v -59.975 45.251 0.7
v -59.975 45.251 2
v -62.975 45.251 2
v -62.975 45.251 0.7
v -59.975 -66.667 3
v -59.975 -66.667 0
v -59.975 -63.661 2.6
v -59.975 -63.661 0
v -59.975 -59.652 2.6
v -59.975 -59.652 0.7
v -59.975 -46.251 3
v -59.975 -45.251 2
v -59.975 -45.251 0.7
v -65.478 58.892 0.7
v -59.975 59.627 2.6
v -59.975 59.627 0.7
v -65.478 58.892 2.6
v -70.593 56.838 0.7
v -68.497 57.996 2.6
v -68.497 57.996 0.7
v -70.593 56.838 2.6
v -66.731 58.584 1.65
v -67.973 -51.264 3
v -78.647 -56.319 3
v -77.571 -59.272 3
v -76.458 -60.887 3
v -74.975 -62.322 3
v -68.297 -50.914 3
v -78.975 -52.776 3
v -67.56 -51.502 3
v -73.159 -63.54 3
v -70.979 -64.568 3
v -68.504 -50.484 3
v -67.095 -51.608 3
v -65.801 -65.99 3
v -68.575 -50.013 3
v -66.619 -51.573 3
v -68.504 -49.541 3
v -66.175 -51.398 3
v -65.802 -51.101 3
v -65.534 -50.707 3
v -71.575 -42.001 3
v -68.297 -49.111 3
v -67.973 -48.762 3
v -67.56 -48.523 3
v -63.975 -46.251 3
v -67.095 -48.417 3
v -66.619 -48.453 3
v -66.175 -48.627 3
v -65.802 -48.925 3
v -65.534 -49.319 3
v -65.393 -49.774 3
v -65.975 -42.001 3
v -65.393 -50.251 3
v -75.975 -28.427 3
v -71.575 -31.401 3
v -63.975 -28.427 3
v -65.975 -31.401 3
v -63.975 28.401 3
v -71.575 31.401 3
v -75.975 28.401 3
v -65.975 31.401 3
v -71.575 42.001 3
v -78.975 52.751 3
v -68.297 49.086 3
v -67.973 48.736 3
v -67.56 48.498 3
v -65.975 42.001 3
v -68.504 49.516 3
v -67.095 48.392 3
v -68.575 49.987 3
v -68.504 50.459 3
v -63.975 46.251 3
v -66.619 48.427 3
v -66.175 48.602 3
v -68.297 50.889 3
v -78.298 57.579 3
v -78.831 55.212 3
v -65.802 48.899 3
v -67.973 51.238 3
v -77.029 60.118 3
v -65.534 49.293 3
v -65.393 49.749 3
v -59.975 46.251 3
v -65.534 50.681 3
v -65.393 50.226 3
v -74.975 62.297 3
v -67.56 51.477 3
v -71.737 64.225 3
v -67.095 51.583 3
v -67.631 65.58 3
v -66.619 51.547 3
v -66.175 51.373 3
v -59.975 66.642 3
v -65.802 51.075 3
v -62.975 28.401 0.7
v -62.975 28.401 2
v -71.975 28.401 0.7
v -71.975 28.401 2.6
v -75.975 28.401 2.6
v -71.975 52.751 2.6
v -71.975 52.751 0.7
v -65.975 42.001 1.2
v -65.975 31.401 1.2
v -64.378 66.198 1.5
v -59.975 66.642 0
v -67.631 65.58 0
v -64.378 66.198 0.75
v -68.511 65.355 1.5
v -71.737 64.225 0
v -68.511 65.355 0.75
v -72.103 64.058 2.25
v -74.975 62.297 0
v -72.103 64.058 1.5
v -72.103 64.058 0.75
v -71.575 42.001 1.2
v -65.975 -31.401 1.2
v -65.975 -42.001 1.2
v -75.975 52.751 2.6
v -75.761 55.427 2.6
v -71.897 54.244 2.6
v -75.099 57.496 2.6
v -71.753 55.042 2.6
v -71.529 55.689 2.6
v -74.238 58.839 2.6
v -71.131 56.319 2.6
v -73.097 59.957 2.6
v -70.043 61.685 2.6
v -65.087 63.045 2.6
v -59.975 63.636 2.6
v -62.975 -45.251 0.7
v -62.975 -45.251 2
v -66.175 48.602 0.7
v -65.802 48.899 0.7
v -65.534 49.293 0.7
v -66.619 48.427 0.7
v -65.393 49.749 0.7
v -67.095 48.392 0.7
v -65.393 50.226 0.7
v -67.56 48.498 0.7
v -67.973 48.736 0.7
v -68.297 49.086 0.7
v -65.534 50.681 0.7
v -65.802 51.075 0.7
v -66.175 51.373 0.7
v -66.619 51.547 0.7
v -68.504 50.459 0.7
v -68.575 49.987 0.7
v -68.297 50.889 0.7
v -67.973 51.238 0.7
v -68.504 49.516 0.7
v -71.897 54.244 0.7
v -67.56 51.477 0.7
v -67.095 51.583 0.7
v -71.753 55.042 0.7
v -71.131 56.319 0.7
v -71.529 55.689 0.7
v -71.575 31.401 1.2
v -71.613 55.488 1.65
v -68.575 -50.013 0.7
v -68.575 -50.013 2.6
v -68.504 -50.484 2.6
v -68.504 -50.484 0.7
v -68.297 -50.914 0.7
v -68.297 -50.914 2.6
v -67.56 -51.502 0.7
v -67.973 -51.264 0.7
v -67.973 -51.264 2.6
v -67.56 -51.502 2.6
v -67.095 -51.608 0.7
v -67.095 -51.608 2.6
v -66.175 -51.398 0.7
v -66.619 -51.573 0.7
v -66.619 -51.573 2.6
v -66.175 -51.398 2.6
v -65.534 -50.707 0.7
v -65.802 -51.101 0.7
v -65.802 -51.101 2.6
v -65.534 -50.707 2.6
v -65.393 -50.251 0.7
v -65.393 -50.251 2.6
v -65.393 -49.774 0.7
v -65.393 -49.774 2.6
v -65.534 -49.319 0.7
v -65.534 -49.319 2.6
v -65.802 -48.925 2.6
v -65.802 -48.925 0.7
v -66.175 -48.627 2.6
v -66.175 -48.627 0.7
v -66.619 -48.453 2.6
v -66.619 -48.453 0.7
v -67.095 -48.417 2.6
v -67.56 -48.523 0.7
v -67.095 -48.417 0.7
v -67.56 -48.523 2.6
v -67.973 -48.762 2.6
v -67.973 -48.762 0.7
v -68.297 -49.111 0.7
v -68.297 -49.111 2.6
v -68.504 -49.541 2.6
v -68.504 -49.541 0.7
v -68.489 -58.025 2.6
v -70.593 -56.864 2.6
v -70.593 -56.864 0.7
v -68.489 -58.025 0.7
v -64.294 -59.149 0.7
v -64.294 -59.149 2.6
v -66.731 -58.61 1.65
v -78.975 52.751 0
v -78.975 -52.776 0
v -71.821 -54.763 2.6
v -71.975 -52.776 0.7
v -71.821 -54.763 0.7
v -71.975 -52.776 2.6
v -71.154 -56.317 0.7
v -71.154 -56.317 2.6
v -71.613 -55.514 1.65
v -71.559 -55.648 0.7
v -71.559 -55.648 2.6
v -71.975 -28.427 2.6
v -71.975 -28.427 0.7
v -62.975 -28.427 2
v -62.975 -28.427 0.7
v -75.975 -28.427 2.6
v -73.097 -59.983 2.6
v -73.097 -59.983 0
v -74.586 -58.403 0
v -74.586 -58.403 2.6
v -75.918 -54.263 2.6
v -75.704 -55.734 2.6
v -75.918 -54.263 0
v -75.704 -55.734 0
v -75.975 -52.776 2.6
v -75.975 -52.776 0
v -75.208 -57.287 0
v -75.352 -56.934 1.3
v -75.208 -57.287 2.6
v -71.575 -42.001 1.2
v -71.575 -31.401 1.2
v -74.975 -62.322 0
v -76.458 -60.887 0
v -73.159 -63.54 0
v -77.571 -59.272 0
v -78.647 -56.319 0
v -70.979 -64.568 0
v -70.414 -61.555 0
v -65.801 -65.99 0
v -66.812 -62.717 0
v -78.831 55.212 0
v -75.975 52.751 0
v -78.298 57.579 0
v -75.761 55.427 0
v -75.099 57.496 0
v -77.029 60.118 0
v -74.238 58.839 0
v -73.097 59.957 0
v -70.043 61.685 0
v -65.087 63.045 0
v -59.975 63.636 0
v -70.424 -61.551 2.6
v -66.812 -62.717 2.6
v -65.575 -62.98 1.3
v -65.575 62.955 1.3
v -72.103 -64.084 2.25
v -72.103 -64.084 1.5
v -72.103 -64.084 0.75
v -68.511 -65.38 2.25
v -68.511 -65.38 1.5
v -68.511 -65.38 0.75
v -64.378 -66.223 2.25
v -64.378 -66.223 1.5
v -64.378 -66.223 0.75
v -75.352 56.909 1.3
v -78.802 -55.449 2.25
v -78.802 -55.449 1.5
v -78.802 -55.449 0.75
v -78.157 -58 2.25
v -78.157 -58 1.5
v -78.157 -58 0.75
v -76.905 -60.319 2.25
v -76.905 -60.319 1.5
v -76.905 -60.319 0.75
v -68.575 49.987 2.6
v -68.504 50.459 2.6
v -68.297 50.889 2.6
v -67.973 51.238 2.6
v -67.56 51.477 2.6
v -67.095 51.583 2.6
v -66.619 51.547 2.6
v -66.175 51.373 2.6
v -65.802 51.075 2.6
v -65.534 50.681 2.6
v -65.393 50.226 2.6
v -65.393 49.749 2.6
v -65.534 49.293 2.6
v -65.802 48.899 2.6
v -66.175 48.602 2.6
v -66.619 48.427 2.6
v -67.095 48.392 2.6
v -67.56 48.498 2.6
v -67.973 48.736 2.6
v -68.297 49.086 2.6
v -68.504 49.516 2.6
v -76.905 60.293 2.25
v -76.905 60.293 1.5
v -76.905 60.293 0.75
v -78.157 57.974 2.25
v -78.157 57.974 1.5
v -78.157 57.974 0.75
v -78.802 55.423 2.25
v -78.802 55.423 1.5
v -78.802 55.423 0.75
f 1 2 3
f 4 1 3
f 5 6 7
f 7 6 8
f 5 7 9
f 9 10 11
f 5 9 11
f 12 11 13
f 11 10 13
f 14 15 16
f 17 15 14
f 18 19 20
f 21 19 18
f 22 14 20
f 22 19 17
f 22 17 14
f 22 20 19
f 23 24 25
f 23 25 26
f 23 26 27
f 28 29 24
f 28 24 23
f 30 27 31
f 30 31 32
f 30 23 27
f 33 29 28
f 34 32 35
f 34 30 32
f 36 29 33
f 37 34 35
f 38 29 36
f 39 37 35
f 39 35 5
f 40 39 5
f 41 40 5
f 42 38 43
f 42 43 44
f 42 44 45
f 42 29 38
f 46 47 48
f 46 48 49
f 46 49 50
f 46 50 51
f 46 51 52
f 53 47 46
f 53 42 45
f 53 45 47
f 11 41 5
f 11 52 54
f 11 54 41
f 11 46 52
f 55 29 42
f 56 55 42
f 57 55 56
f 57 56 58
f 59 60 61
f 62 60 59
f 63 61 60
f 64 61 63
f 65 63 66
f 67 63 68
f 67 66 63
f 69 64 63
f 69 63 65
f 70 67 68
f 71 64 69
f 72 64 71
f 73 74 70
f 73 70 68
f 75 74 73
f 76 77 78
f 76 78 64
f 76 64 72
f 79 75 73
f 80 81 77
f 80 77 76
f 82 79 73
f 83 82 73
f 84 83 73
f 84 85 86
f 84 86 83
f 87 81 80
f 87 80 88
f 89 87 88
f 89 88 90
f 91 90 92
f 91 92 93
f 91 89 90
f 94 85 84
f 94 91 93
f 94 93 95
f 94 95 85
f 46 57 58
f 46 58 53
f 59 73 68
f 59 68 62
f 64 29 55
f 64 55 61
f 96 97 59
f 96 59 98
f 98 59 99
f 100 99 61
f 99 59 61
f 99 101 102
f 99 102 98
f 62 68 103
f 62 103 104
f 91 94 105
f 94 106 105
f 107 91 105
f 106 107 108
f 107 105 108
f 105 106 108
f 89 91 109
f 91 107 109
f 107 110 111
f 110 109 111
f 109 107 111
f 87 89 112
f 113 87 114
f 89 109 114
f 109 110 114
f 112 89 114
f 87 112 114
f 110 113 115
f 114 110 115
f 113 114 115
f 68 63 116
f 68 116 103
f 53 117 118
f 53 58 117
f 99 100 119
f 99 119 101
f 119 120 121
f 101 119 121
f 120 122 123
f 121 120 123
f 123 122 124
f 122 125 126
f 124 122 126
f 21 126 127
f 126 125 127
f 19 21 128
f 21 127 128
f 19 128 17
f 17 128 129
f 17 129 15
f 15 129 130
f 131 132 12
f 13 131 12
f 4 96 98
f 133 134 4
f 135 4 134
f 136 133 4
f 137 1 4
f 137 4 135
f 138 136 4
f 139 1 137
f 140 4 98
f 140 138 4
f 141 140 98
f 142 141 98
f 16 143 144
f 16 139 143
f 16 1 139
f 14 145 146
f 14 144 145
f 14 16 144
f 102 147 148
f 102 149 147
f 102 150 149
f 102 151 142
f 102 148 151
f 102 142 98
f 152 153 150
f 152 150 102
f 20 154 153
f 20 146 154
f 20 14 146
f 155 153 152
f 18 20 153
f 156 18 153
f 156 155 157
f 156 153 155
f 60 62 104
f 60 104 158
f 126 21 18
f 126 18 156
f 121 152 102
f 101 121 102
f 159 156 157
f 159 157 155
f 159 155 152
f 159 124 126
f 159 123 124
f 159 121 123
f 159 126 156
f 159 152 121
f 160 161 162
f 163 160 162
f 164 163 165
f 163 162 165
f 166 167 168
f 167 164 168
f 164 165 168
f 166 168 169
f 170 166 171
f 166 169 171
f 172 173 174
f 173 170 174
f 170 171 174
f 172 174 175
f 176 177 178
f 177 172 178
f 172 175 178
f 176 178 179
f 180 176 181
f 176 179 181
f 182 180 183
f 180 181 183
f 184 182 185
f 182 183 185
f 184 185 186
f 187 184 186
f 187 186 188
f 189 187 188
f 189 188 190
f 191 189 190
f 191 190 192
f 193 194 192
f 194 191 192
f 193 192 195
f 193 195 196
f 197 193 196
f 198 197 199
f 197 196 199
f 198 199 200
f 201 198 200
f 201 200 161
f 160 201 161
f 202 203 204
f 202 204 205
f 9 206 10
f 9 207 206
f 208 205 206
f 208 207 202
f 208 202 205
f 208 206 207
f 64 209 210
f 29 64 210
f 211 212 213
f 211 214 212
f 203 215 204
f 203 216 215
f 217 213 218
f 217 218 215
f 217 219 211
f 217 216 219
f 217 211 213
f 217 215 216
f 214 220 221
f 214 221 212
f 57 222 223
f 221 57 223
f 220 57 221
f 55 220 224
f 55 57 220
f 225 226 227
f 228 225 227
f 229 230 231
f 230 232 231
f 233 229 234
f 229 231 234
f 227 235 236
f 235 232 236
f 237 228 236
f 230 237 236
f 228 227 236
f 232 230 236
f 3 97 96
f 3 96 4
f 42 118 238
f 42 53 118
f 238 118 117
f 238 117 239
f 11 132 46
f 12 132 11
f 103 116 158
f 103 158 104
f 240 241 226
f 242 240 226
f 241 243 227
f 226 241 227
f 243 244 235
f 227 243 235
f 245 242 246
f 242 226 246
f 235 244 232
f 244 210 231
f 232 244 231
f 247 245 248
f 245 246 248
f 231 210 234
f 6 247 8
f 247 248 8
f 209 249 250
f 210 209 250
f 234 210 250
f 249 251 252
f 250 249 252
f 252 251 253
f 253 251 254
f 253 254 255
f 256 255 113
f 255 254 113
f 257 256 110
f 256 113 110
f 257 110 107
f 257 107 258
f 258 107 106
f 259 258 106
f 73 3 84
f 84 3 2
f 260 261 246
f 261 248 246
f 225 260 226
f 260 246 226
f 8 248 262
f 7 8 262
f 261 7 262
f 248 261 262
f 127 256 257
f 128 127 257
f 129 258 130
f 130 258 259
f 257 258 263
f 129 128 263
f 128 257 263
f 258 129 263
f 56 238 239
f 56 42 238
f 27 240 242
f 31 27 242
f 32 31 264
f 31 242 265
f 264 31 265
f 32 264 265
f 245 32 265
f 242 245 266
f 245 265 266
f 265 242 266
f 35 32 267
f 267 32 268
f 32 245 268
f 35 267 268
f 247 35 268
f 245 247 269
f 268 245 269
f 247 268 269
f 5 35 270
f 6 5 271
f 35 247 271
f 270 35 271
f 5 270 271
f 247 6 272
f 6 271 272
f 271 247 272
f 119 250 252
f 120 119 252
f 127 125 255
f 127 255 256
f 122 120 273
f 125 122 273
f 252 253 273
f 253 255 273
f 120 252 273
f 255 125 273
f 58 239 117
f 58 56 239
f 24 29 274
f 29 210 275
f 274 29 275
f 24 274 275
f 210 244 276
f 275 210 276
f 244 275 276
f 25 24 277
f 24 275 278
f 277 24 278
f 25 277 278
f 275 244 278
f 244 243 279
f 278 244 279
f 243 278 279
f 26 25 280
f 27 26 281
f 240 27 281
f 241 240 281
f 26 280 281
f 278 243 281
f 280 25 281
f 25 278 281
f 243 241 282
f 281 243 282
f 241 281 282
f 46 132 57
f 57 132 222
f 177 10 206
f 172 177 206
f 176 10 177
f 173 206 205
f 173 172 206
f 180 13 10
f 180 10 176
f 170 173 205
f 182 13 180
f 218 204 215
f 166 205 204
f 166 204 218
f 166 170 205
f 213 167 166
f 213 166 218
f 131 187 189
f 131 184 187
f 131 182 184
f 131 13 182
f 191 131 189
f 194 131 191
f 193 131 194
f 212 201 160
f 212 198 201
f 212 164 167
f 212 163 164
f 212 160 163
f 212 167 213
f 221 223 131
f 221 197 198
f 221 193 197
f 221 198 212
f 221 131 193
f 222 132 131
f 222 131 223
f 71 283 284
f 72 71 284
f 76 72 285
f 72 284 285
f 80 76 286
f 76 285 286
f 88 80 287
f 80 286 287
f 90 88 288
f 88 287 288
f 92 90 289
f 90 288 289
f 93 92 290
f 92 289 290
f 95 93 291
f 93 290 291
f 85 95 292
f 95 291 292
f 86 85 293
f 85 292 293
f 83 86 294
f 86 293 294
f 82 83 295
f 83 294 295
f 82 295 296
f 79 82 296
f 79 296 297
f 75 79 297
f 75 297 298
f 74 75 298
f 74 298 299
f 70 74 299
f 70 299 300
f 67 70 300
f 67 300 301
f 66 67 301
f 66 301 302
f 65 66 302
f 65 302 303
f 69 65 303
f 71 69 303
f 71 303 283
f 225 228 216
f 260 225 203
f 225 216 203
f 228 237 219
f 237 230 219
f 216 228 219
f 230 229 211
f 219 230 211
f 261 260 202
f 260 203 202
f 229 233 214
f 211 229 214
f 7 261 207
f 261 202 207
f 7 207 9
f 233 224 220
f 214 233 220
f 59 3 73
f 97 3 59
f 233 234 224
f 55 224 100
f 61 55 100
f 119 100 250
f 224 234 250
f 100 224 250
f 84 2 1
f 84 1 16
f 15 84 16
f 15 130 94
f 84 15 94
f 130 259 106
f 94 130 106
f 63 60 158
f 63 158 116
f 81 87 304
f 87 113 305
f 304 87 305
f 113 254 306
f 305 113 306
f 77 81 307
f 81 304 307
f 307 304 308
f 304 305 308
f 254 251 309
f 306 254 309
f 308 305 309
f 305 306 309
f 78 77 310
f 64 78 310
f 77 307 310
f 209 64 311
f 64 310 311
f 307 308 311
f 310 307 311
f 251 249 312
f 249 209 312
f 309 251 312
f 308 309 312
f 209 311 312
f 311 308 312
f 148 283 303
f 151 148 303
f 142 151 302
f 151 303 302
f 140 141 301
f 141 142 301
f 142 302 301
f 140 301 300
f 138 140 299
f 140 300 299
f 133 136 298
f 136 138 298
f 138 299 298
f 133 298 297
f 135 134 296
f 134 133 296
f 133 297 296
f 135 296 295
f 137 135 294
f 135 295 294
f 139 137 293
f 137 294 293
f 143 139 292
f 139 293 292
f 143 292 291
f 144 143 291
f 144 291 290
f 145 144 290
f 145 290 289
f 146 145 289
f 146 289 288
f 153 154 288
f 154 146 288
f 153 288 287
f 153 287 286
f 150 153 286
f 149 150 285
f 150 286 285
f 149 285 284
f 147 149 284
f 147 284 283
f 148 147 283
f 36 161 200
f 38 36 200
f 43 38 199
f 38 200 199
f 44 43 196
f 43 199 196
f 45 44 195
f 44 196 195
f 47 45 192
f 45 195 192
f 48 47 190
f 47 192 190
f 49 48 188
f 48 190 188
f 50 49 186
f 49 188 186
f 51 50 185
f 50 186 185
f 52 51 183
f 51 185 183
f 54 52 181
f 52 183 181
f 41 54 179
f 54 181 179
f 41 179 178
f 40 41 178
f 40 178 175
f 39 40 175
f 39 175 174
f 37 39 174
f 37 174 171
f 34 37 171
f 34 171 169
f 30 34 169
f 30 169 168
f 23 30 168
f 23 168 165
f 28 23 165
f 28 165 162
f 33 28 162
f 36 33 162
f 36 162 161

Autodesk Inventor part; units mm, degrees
ref_plane "YZ Plane" through (0, 0, 0) normal (1, 0, 0) x (0, 1, 0)
ref_plane "XZ Plane" through (0, 0, 0) normal (0, 1, 0) x (-1, 0, 0)
ref_plane "XY Plane" through (0, 0, 0) normal (0, 0, 1) x (1, 0, 0)
sketch "Эскиз1" plane through (0, 0, 0) normal (0, 0, 1) x (1, 0, 0)
  arc A0 (21.9698, 25.0872) -> (24.9698, 22.0872) centre (24.9698, 25.0872) ccw
  line L0 (24.9698, 22.0872) -> (32.4715, 22.0872)
  arc A1 (35.4715, 19.0872) -> (32.4715, 22.0872) centre (32.4715, 19.0872) ccw
  line L1 (35.4715, 19.0872) -> (35.4715, -12.1128)
  arc A2 (32.4715, -15.1128) -> (35.4715, -12.1128) centre (32.4715, -12.1128) ccw
  line L2 (32.4715, -15.1128) -> (24.9698, -15.1128)
  arc A3 (24.9698, -15.1128) -> (21.9698, -18.1128) centre (24.9698, -18.1128) ccw
  line L3 (21.9698, -18.1128) -> (21.9698, -28.1128)
  line L4 (21.9698, -28.1128) -> (36.9698, -28.1128)
  line L5 (36.9698, -28.1128) -> (36.9698, -40.6128)
  line L6 (36.9698, -40.6128) -> (21.9698, -40.6128)
  line L7 (21.9698, -40.6128) -> (21.9698, -43.5128)
  line L8 (21.9698, -43.5128) -> (58.0248, -43.5128)
  arc A4 (60.0248, -45.5128) -> (58.0248, -43.5128) centre (58.0248, -45.5128) ccw
  line L9 (60.0248, -45.5128) -> (60.0248, -60.8075)
  arc A5 (58.0248, -62.8075) -> (60.0248, -60.8075) centre (58.0248, -60.8075) ccw
  line L10 (58.0248, -62.8075) -> (-57.9752, -62.8075)
  arc A6 (-59.9752, -60.8075) -> (-57.9752, -62.8075) centre (-57.9752, -60.8075) ccw
  line L11 (-59.9752, -60.8075) -> (-59.9752, -45.5128)
  arc A7 (-57.9752, -43.5128) -> (-59.9752, -45.5128) centre (-57.9752, -45.5128) ccw
  line L12 (-57.9752, -43.5128) -> (-22.0457, -43.5128)
  line L13 (-22.0457, -43.5128) -> (-22.0457, -40.6128)
  line L14 (-22.0457, -40.6128) -> (-39.5957, -40.6128)
  line L15 (-39.5957, -40.6128) -> (-39.5957, -29.6128)
  line L16 (-39.5957, -29.6128) -> (-22.0457, -29.6128)
  line L17 (-22.0457, -29.6128) -> (-22.0457, -27.6266)
  line L18 (-22.0457, -27.6266) -> (-23.1715, -27.6266)
  line L19 (-23.1715, -27.6266) -> (-23.1715, -10.2508)
  line L20 (-23.1715, -10.2508) -> (-22.0457, -10.2508)
  line L21 (-22.0457, -10.2508) -> (-22.0457, -5.0128)
  line L22 (-22.0457, -5.0128) -> (-25.0457, -5.0128)
  line L23 (-25.0457, -5.0128) -> (-25.0457, 4.9872)
  line L24 (-25.0457, 4.9872) -> (-22.0457, 4.9872)
  line L25 (-22.0457, 4.9872) -> (-22.0457, 10.2252)
  line L26 (-22.0457, 10.2252) -> (-23.1715, 10.2252)
  line L27 (-23.1715, 10.2252) -> (-23.1715, 27.601)
  line L28 (-23.1715, 27.601) -> (-22.0457, 27.601)
  line L29 (-22.0457, 27.601) -> (-22.0457, 43.4872)
  line L30 (-22.0457, 43.4872) -> (-57.9752, 43.4872)
  arc A8 (-59.9752, 45.4872) -> (-57.9752, 43.4872) centre (-57.9752, 45.4872) ccw
  line L31 (-59.9752, 45.4872) -> (-59.9752, 60.782)
  arc A9 (-57.9752, 62.782) -> (-59.9752, 60.782) centre (-57.9752, 60.782) ccw
  line L32 (-57.9752, 62.782) -> (58.0248, 62.782)
  arc A10 (60.0248, 60.782) -> (58.0248, 62.782) centre (58.0248, 60.782) ccw
  line L33 (60.0248, 60.782) -> (60.0248, 45.4872)
  arc A11 (58.0248, 43.4872) -> (60.0248, 45.4872) centre (58.0248, 45.4872) ccw
  line L34 (58.0248, 43.4872) -> (21.9698, 43.4872)
  line L35 (21.9698, 43.4872) -> (21.9698, 25.0872)
  circle A12 centre (-51.6466, 22.9919) radius 1.5
  circle A13 centre (-51.6466, -23.0174) radius 1.5
  line L36 (-50.445, -3.8128) -> (-50.445, 15.6872)
  arc A14 (-47.445, 18.6872) -> (-50.445, 15.6872) centre (-47.445, 15.6872) ccw
  line L37 (-47.445, 18.6872) -> (-33.6813, 18.6872)
  arc A15 (-30.6813, 15.6872) -> (-33.6813, 18.6872) centre (-33.6813, 15.6872) ccw
  line L38 (-30.6813, 15.6872) -> (-30.6813, -3.8128)
  arc A16 (-33.6813, -6.8128) -> (-30.6813, -3.8128) centre (-33.6813, -3.8128) ccw
  line L39 (-33.6813, -6.8128) -> (-47.445, -6.8128)
  arc A17 (-50.445, -3.8128) -> (-47.445, -6.8128) centre (-47.445, -3.8128) ccw
  line L40 (60.4248, -29.3128) -> (60.4248, -21.9128)
  line L41 (60.4248, -21.9128) -> (74.9248, -21.9128)
  line L42 (74.9248, -21.9128) -> (74.9248, -29.3128)
  line L43 (74.9248, -29.3128) -> (60.4248, -29.3128)
  line L44 (60.4248, 21.8872) -> (60.4248, 29.2872)
  line L45 (60.4248, 29.2872) -> (74.9248, 29.2872)
  line L46 (74.9248, 29.2872) -> (74.9248, 21.8872)
  line L47 (74.9248, 21.8872) -> (60.4248, 21.8872)
  line L48 (79.0248, -17.5128) -> (68.0248, -17.5128)
  line L49 (68.0248, -17.5128) -> (68.0248, -6.0128)
  line L50 (68.0248, -6.0128) -> (63.1715, -6.0128)
  arc A18 (62.1715, -5.0128) -> (63.1715, -6.0128) centre (63.1715, -5.0128) ccw
  line L51 (62.1715, -5.0128) -> (62.1715, 4.9872)
  arc A19 (63.1715, 5.9872) -> (62.1715, 4.9872) centre (63.1715, 4.9872) ccw
  line L52 (63.1715, 5.9872) -> (68.0248, 5.9872)
  line L53 (68.0248, 5.9872) -> (68.0248, 17.4872)
  line L54 (68.0248, 17.4872) -> (79.0248, 17.4872)
  line L55 (79.0248, 17.4872) -> (79.0248, 52.7508)
  spline S0 degree 4 poles (79.0248, 52.7508) (79.0248, 55.4389) (78.6593, 58.1507) (77.2994, 60.4709) (75.0248, 62.2967) knots 0 0 0 0 0 1 1 1 1 1
  spline S1 degree 4 poles (75.0248, 62.2967) (71.8239, 64.8662) (66.8118, 66.4567) (60.2111, 66.782) (55.0248, 66.782) knots 0.415412 0.415412 0.415412 0.415412 0.415412 1 1 1 1 1
  line L56 (-54.9752, 66.782) -> (55.0248, 66.782)
  spline S2 degree 4 poles (-54.9752, 66.782) (-60.1615, 66.782) (-66.7622, 66.4567) (-71.7743, 64.8662) (-74.9752, 62.2967) knots 0 0 0 0 0 0.584588 0.584588 0.584588 0.584588 0.584588
  spline S3 degree 4 poles (-74.9752, 62.2967) (-77.2498, 60.4709) (-78.6098, 58.1507) (-78.9752, 55.4389) (-78.9752, 52.7508) knots 0 0 0 0 0 1 1 1 1 1
  line L57 (-78.9752, 52.7508) -> (-78.9752, -52.7764)
  spline S4 degree 4 poles (-78.9752, -52.7764) (-78.9752, -55.4644) (-78.6098, -58.1763) (-77.2498, -60.4964) (-74.9752, -62.3223) knots 0 0 0 0 0 1 1 1 1 1
  spline S5 degree 4 poles (-74.9752, -62.3223) (-71.7743, -64.8917) (-66.7622, -66.4822) (-60.1615, -66.8075) (-54.9752, -66.8075) knots 0.415412 0.415412 0.415412 0.415412 0.415412 1 1 1 1 1
  line L58 (55.0248, -66.8075) -> (-54.9752, -66.8075)
  spline S6 degree 4 poles (55.0248, -66.8075) (60.2111, -66.8075) (66.8118, -66.4822) (71.8239, -64.8917) (75.0248, -62.3223) knots 0 0 0 0 0 0.584588 0.584588 0.584588 0.584588 0.584588
  spline S7 degree 4 poles (75.0248, -62.3223) (77.2994, -60.4964) (78.6593, -58.1763) (79.0248, -55.4644) (79.0248, -52.7764) knots 0 0 0 0 0 1 1 1 1 1
  line L59 (79.0248, -52.7764) -> (79.0248, -17.5128)
  circle A20 centre (-29.4752, -25.5128) radius 1.25
  circle A21 centre (29.5248, 25.4872) radius 1.25
  circle A22 centre (29.5248, -25.5128) radius 1.25
  circle A23 centre (-29.4752, 25.4872) radius 1.25
  circle A24 centre (-51.6466, 22.9919) radius 2.1
  circle A25 centre (-51.6466, -23.0174) radius 2.1
  line L60 (-72.9752, -28.1266) -> (-39.8957, -28.1266)
  line L61 (-39.8957, 28.101) -> (-72.9752, 28.101)
  line L62 (-39.8957, 28.101) -> (-39.8957, 16.9648)
  ellipse E0 centre (-48.5541, 13.1872) end of major axis (-34.5198, 13.1872) minor radius 4.8 (-39.8957, 16.9648) -> (-62.5883, 13.1872) ccw
  line L63 (-62.5883, 13.1872) -> (-62.5883, -1.3128)
  ellipse E1 centre (-48.5541, -1.3128) end of major axis (-62.5883, -1.3128) minor radius 4.8 (-62.5883, -1.3128) -> (-39.8957, -5.0904) ccw
  line L64 (-39.8957, -5.0904) -> (-39.8957, -28.1266)
  line L65 (-59.9752, -66.667) -> (-59.9752, 66.6415)
  line L66 (-75.9752, -52.7764) -> (-75.9752, 52.7508)
  line L67 (-54.9752, 63.782) -> (55.0248, 63.782)
  line L68 (76.0248, 52.7508) -> (76.0248, 20.4872)
  line L69 (76.0248, 20.4872) -> (65.0248, 20.4872)
  line L70 (65.0248, 20.4872) -> (65.0248, 8.9872)
  line L71 (65.0248, 8.9872) -> (63.1715, 8.9872)
  arc A26 (63.1715, 8.9872) -> (59.1715, 4.9872) centre (63.1715, 4.9872) ccw
  line L72 (59.1715, 4.9872) -> (59.1715, -5.0128)
  arc A27 (59.1715, -5.0128) -> (63.1715, -9.0128) centre (63.1715, -5.0128) ccw
  line L73 (63.1715, -9.0128) -> (65.0248, -9.0128)
  line L74 (65.0248, -9.0128) -> (65.0248, -20.5128)
  line L75 (65.0248, -20.5128) -> (76.0248, -20.5128)
  line L76 (76.0248, -20.5128) -> (76.0248, -52.7764)
  line L77 (55.0248, -63.8075) -> (-54.9752, -63.8075)
  line L78 (-72.9752, -28.1266) -> (-72.9752, 28.101)
  spline S8 degree 5 poles (-73.0972, -59.9828) (-73.6957, -59.5017) (-74.2433, -58.9582) (-74.7152, -58.3353) (-75.4815, -56.9001) (-75.8411, -55.3112) (-75.9357, -54.4671) (-75.9756, -53.6221) (-75.9752, -52.7764) knots 0 0 0 0 0 0 0.475904 0.475904 0.475904 1 1 1 1 1 1
  spline S9 degree 5 poles (-75.9752, 52.7508) (-75.9756, 53.5966) (-75.9357, 54.4415) (-75.8411, 55.2856) (-75.4815, 56.8745) (-74.7152, 58.3097) (-74.2433, 58.9326) (-73.6957, 59.4761) (-73.0972, 59.9572) knots 0 0 0 0 0 0 0.524096 0.524096 0.524096 1 1 1 1 1 1
  spline S10 degree 5 poles (-73.0972, 59.9572) (-71.8214, 60.9817) (-70.3144, 61.7034) (-68.7678, 62.2382) (-65.1123, 63.1767) (-61.3615, 63.5924) (-59.2342, 63.7293) (-57.1048, 63.7818) (-54.9752, 63.782) knots 0 0 0 0 0 0 0.434284 0.434284 0.434284 1 1 1 1 1 1
  spline S11 degree 5 poles (55.0248, 63.782) (57.1544, 63.7818) (59.2838, 63.7293) (61.4111, 63.5924) (65.1619, 63.1767) (68.8174, 62.2382) (70.364, 61.7034) (71.871, 60.9817) (73.1468, 59.9572) knots 0 0 0 0 0 0 0.565716 0.565716 0.565716 1 1 1 1 1 1
  spline S12 degree 5 poles (73.1468, 59.9572) (73.7453, 59.4761) (74.2929, 58.9326) (74.7647, 58.3097) (75.531, 56.8745) (75.8907, 55.2856) (75.9853, 54.4415) (76.0252, 53.5966) (76.0248, 52.7508) knots 0 0 0 0 0 0 0.475904 0.475904 0.475904 1 1 1 1 1 1
  spline S13 degree 5 poles (76.0248, -52.7764) (76.0252, -53.6221) (75.9853, -54.4671) (75.8907, -55.3112) (75.531, -56.9001) (74.7647, -58.3353) (74.2929, -58.9582) (73.7453, -59.5017) (73.1468, -59.9828) knots 0 0 0 0 0 0 0.524096 0.524096 0.524096 1 1 1 1 1 1
  spline S14 degree 5 poles (73.1468, -59.9828) (71.871, -61.0073) (70.364, -61.7289) (68.8174, -62.2638) (65.1619, -63.2022) (61.4111, -63.618) (59.2838, -63.7549) (57.1544, -63.8074) (55.0248, -63.8075) knots 0 0 0 0 0 0 0.434284 0.434284 0.434284 1 1 1 1 1 1
  spline S15 degree 5 poles (-54.9752, -63.8075) (-57.1048, -63.8074) (-59.2342, -63.7549) (-61.3615, -63.618) (-65.1123, -63.2022) (-68.7678, -62.2638) (-70.3144, -61.7289) (-71.8214, -61.0073) (-73.0972, -59.9828) knots 0 0 0 0 0 0 0.565716 0.565716 0.565716 1 1 1 1 1 1
  point P0 (0, 0)
  point P1 (-78.9752, -28.1266)
  point P2 (-78.9752, 28.101)
  point P3 (-59.9752, -63.6611)
  point P4 (-59.9752, 63.6356)
  dimension "d0" = 3
extrude "Выдавливание1" add sketch "Эскиз1" along normal blind 3 contours S10 S9 L66 S8 S15 L65 S5 S4 L57 S3 S2
sketch "Эскиз3" plane through (0, 0, 3) normal (0, 0, 1) x (1, 0, 0)
  line L0 (-78.9752, 52.7508) -> (-78.9752, -52.7764) projected
  line L1 (-59.9752, -66.667) -> (-59.9752, -63.6611) projected
  spline S0 degree 5 poles (-59.9752, -63.6611) (-61.1018, -63.5885) (-62.2267, -63.4897) (-63.3488, -63.36) (-66.084, -62.9528) (-68.7678, -62.2638) (-70.3144, -61.7289) (-71.8214, -61.0073) (-73.0972, -59.9828) knots 0 0 0 0 0 0 0.408481 0.408481 0.408481 1 1 1 1 1 1 projected
  spline S1 degree 5 poles (-73.0972, -59.9828) (-73.6957, -59.5017) (-74.2433, -58.9582) (-74.7152, -58.3353) (-75.4815, -56.9001) (-75.8411, -55.3112) (-75.9357, -54.4671) (-75.9756, -53.6221) (-75.9752, -52.7764) knots 0 0 0 0 0 0 0.475904 0.475904 0.475904 1 1 1 1 1 1 projected
  line L2 (-75.9752, -52.7764) -> (-75.9752, 52.7508) projected
  spline S2 degree 5 poles (-75.9752, 52.7508) (-75.9756, 53.5966) (-75.9357, 54.4415) (-75.8411, 55.2856) (-75.4815, 56.8745) (-74.7152, 58.3097) (-74.2433, 58.9326) (-73.6957, 59.4761) (-73.0972, 59.9572) knots 0 0 0 0 0 0 0.524096 0.524096 0.524096 1 1 1 1 1 1 projected
  spline S3 degree 5 poles (-73.0972, 59.9572) (-71.8214, 60.9817) (-70.3144, 61.7034) (-68.7678, 62.2382) (-66.084, 62.9272) (-63.3488, 63.3345) (-62.2267, 63.4641) (-61.1018, 63.5629) (-59.9752, 63.6355) knots 0 0 0 0 0 0 0.591519 0.591519 0.591519 1 1 1 1 1 1 projected
  line L3 (-59.9752, 63.6356) -> (-59.9752, 66.6415) projected
  line L4 (-39.8957, 28.101) -> (-59.6752, 28.101) projected
  line L5 (-39.8957, 28.101) -> (-39.8957, 16.9648) projected
  circle A0 centre (-51.6466, 22.9919) radius 2.1 projected
  line L6 (-78.9752, -28.1266) -> (-76.3894, -28.1266) projected
  line L7 (-78.9752, 28.101) -> (-78.9752, -28.1266) projected
  line L8 (-76.3894, 28.101) -> (-78.9752, 28.101) projected
  line L9 (-59.9752, -66.667) -> (-59.9752, -63.6611) projected
  line L10 (-59.9752, -63.6611) -> (-59.9752, 63.6356)
  line L11 (-59.9752, -28.4266) -> (-78.9752, -28.4266)
  line L12 (-59.9752, 28.401) -> (-78.9752, 28.401)
  line L13 (-76.3894, -28.1266) -> (-76.3894, 28.101) projected
  ellipse E0 centre (-48.5541, 13.1872) end of major axis (-34.5198, 13.1872) minor radius 4.8 (-39.8957, 16.9648) -> (-59.6752, 16.115) ccw projected
  line L14 (-59.6752, 16.115) -> (-59.6752, 28.101) projected
  point P0 (0, 0)
  point P1 (-75.9752, 28.401)
  point P2 (-75.9752, -28.4266)
  dimension "d5" = 0.3
extrude "Выдавливание3" add sketch "Эскиз3" against normal blind 0.4 contours L2 S2 S3 L10 L12 | L11 L10 S0 S1 L2
sketch "Эскиз4" plane through (0, 0, 2.6) normal (0, 0, -1) x (-1, 0, 0)
  circle A0 centre (66.9752, -50.0128) radius 1.35
  circle A1 centre (66.9752, 49.9872) radius 1.35
  arc A2 (57.945, -33.5297) -> (52.945, -33.5297) centre (55.445, -33.5297) ccw
  line L0 (57.945, -33.5297) -> (57.945, -38.6097)
  arc A3 (52.945, -38.6097) -> (57.945, -38.6097) centre (55.445, -38.6097) ccw
  line L1 (52.945, -38.6097) -> (52.945, -33.5297)
  line L2 (44.445, -39.1128) -> (44.445, -31.1128)
  arc A4 (45.445, -30.1128) -> (44.445, -31.1128) centre (45.445, -31.1128) ccw
  line L3 (45.445, -30.1128) -> (48.445, -30.1128)
  arc A5 (49.445, -31.1128) -> (48.445, -30.1128) centre (48.445, -31.1128) ccw
  line L4 (49.445, -31.1128) -> (49.445, -39.1128)
  arc A6 (48.445, -40.1128) -> (49.445, -39.1128) centre (48.445, -39.1128) ccw
  line L5 (48.445, -40.1128) -> (45.445, -40.1128)
  arc A7 (44.445, -39.1128) -> (45.445, -40.1128) centre (45.445, -39.1128) ccw
  arc A8 (40.445, -8.8128) -> (38.445, -6.8128) centre (38.445, -8.8128) ccw
  line L6 (38.445, -6.8128) -> (33.6813, -6.8128)
  arc A9 (30.6813, -3.8128) -> (33.6813, -6.8128) centre (33.6813, -3.8128) ccw
  line L7 (30.6813, -3.8128) -> (30.6813, 15.6872)
  arc A10 (33.6813, 18.6872) -> (30.6813, 15.6872) centre (33.6813, 15.6872) ccw
  line L8 (33.6813, 18.6872) -> (47.445, 18.6872)
  arc A11 (50.445, 15.6872) -> (47.445, 18.6872) centre (47.445, 15.6872) ccw
  line L9 (50.445, 15.6872) -> (50.445, -14.8128)
  arc A12 (48.445, -16.8128) -> (50.445, -14.8128) centre (48.445, -14.8128) ccw
  line L10 (48.445, -16.8128) -> (42.445, -16.8128)
  arc A13 (40.445, -14.8128) -> (42.445, -16.8128) centre (42.445, -14.8128) ccw
  line L11 (40.445, -14.8128) -> (40.445, -8.8128)
  circle A14 centre (51.6466, 22.9919) radius 1.5
  circle A15 centre (51.6466, -23.0174) radius 1.5
  line L12 (-60.4248, -21.9128) -> (-60.4248, -29.3128)
  line L13 (-60.4248, -29.3128) -> (-74.9248, -29.3128)
  line L14 (-74.9248, -29.3128) -> (-74.9248, -21.9128)
  line L15 (-74.9248, -21.9128) -> (-60.4248, -21.9128)
  line L16 (-60.4248, 29.2872) -> (-60.4248, 21.8872)
  line L17 (-60.4248, 21.8872) -> (-74.9248, 21.8872)
  line L18 (-74.9248, 21.8872) -> (-74.9248, 29.2872)
  line L19 (-74.9248, 29.2872) -> (-60.4248, 29.2872)
  line L20 (-68.0248, -17.5128) -> (-79.0248, -17.5128)
  line L21 (-79.0248, -52.7764) -> (-79.0248, -17.5128)
  spline S0 degree 4 poles (-75.0248, -62.3223) (-77.2994, -60.4964) (-78.6593, -58.1763) (-79.0248, -55.4644) (-79.0248, -52.7764) knots 0 0 0 0 0 1 1 1 1 1
  spline S1 degree 4 poles (-55.0248, -66.8075) (-60.2111, -66.8075) (-66.8118, -66.4822) (-71.8239, -64.8917) (-75.0248, -62.3223) knots 0 0 0 0 0 0.584588 0.584588 0.584588 0.584588 0.584588
  line L22 (54.9752, -66.8075) -> (-55.0248, -66.8075)
  spline S2 degree 4 poles (74.9752, -62.3223) (71.7743, -64.8917) (66.7622, -66.4822) (60.1615, -66.8075) (54.9752, -66.8075) knots 0.415412 0.415412 0.415412 0.415412 0.415412 1 1 1 1 1
  spline S3 degree 4 poles (78.9752, -52.7764) (78.9752, -55.4644) (78.6098, -58.1763) (77.2498, -60.4964) (74.9752, -62.3223) knots 0 0 0 0 0 1 1 1 1 1
  line L23 (78.9752, 52.7508) -> (78.9752, -52.7764)
  spline S4 degree 4 poles (74.9752, 62.2967) (77.2498, 60.4709) (78.6098, 58.1507) (78.9752, 55.4389) (78.9752, 52.7508) knots 0 0 0 0 0 1 1 1 1 1
  spline S5 degree 4 poles (54.9752, 66.782) (60.1615, 66.782) (66.7622, 66.4567) (71.7743, 64.8662) (74.9752, 62.2967) knots 0 0 0 0 0 0.584588 0.584588 0.584588 0.584588 0.584588
  line L24 (-55.0248, 66.782) -> (54.9752, 66.782)
  spline S6 degree 4 poles (-75.0248, 62.2967) (-71.8239, 64.8662) (-66.8118, 66.4567) (-60.2111, 66.782) (-55.0248, 66.782) knots 0.415412 0.415412 0.415412 0.415412 0.415412 1 1 1 1 1
  spline S7 degree 4 poles (-79.0248, 52.7508) (-79.0248, 55.4389) (-78.6593, 58.1507) (-77.2994, 60.4709) (-75.0248, 62.2967) knots 0 0 0 0 0 1 1 1 1 1
  line L25 (-79.0248, 17.4872) -> (-79.0248, 52.7508)
  line L26 (-79.0248, 17.4872) -> (-68.0248, 17.4872)
  line L27 (-68.0248, 17.4872) -> (-68.0248, 5.9872)
  line L28 (-68.0248, 5.9872) -> (-63.1715, 5.9872)
  arc A16 (-62.1715, 4.9872) -> (-63.1715, 5.9872) centre (-63.1715, 4.9872) ccw
  line L29 (-62.1715, 4.9872) -> (-62.1715, -5.0128)
  arc A17 (-63.1715, -6.0128) -> (-62.1715, -5.0128) centre (-63.1715, -5.0128) ccw
  line L30 (-63.1715, -6.0128) -> (-68.0248, -6.0128)
  line L31 (-68.0248, -6.0128) -> (-68.0248, -17.5128)
  circle A18 centre (29.4752, -25.5128) radius 1.25
  circle A19 centre (-29.5248, 25.4872) radius 1.25
  circle A20 centre (-29.5248, -25.5128) radius 1.25
  circle A21 centre (29.4752, 25.4872) radius 1.25
  arc A22 (-24.9698, 22.0872) -> (-21.9698, 25.0872) centre (-24.9698, 25.0872) ccw
  line L32 (-21.9698, 25.0872) -> (-21.9698, 43.4872)
  line L33 (-58.0248, 43.4872) -> (-21.9698, 43.4872)
  arc A23 (-60.0248, 45.4872) -> (-58.0248, 43.4872) centre (-58.0248, 45.4872) ccw
  line L34 (-60.0248, 45.4872) -> (-60.0248, 60.782)
  arc A24 (-58.0248, 62.782) -> (-60.0248, 60.782) centre (-58.0248, 60.782) ccw
  line L35 (-58.0248, 62.782) -> (57.9752, 62.782)
  arc A25 (59.9752, 60.782) -> (57.9752, 62.782) centre (57.9752, 60.782) ccw
  line L36 (59.9752, 60.782) -> (59.9752, 45.4872)
  arc A26 (57.9752, 43.4872) -> (59.9752, 45.4872) centre (57.9752, 45.4872) ccw
  line L37 (22.0457, 43.4872) -> (57.9752, 43.4872)
  line L38 (22.0457, 43.4872) -> (22.0457, 27.601)
  line L39 (22.0457, 27.601) -> (23.1715, 27.601)
  line L40 (23.1715, 27.601) -> (23.1715, 10.2252)
  line L41 (23.1715, 10.2252) -> (22.0457, 10.2252)
  line L42 (22.0457, 10.2252) -> (22.0457, 4.9872)
  line L43 (22.0457, 4.9872) -> (25.0457, 4.9872)
  line L44 (25.0457, 4.9872) -> (25.0457, -5.0128)
  line L45 (25.0457, -5.0128) -> (22.0457, -5.0128)
  line L46 (22.0457, -5.0128) -> (22.0457, -10.2508)
  line L47 (22.0457, -10.2508) -> (23.1715, -10.2508)
  line L48 (23.1715, -10.2508) -> (23.1715, -27.6266)
  line L49 (23.1715, -27.6266) -> (22.0457, -27.6266)
  line L50 (22.0457, -27.6266) -> (22.0457, -29.6128)
  line L51 (22.0457, -29.6128) -> (39.5957, -29.6128)
  line L52 (39.5957, -29.6128) -> (39.5957, -40.6128)
  line L53 (39.5957, -40.6128) -> (22.0457, -40.6128)
  line L54 (22.0457, -40.6128) -> (22.0457, -43.5128)
  line L55 (57.9752, -43.5128) -> (22.0457, -43.5128)
  arc A27 (59.9752, -45.5128) -> (57.9752, -43.5128) centre (57.9752, -45.5128) ccw
  line L56 (59.9752, -45.5128) -> (59.9752, -60.8075)
  arc A28 (57.9752, -62.8075) -> (59.9752, -60.8075) centre (57.9752, -60.8075) ccw
  line L57 (57.9752, -62.8075) -> (-58.0248, -62.8075)
  arc A29 (-60.0248, -60.8075) -> (-58.0248, -62.8075) centre (-58.0248, -60.8075) ccw
  line L58 (-60.0248, -60.8075) -> (-60.0248, -45.5128)
  arc A30 (-58.0248, -43.5128) -> (-60.0248, -45.5128) centre (-58.0248, -45.5128) ccw
  line L59 (-21.9698, -43.5128) -> (-58.0248, -43.5128)
  line L60 (-21.9698, -43.5128) -> (-21.9698, -40.6128)
  line L61 (-21.9698, -40.6128) -> (-36.9698, -40.6128)
  line L62 (-36.9698, -40.6128) -> (-36.9698, -28.1128)
  line L63 (-36.9698, -28.1128) -> (-21.9698, -28.1128)
  line L64 (-21.9698, -28.1128) -> (-21.9698, -18.1128)
  arc A31 (-21.9698, -18.1128) -> (-24.9698, -15.1128) centre (-24.9698, -18.1128) ccw
  line L65 (-24.9698, -15.1128) -> (-32.4715, -15.1128)
  arc A32 (-35.4715, -12.1128) -> (-32.4715, -15.1128) centre (-32.4715, -12.1128) ccw
  line L66 (-35.4715, -12.1128) -> (-35.4715, 19.0872)
  arc A33 (-32.4715, 22.0872) -> (-35.4715, 19.0872) centre (-32.4715, 19.0872) ccw
  line L67 (-32.4715, 22.0872) -> (-24.9698, 22.0872)
  circle A34 centre (66.9752, 49.9872) radius 1.6
  circle A35 centre (66.9752, -50.0128) radius 1.6
  point P0 (0, 0)
  dimension "d9" = 3.2
  dimension "d10" = 3.2
extrude "Выдавливание4" cut sketch "Эскиз4" against normal blind 1 contours A0 | A1 | A34 | A35
sketch "Эскиз5" plane through (0, 0, 2.6) normal (0, 0, -1) x (-1, 0, 0)
  circle A0 centre (66.9752, 49.9872) radius 1.6
  circle A1 centre (66.9752, -50.0128) radius 1.6
  line L0 (78.9752, 52.7508) -> (78.9752, -52.7764)
  line L1 (59.9752, -66.667) -> (59.9752, -28.4266)
  line L2 (59.9752, -28.4266) -> (75.9752, -28.4266)
  line L3 (75.9752, -28.4266) -> (75.9752, 28.401)
  line L4 (75.9752, 28.401) -> (59.9752, 28.401)
  line L5 (59.9752, 28.401) -> (59.9752, 66.6415)
  line L6 (78.9752, 52.7508) -> (78.9752, -52.7764)
  spline S0 degree 4 poles (74.9752, 62.2967) (77.2498, 60.4709) (78.6098, 58.1507) (78.9752, 55.4389) (78.9752, 52.7508) knots 0 0 0 0 0 1 1 1 1 1
  spline S1 degree 4 poles (59.9752, 66.6415) (64.3981, 66.3697) (68.939, 65.6863) (72.4991, 64.2844) (74.9752, 62.2967) knots 0 0 0 0 0 1 1 1 1 1
  spline S2 degree 3 poles (73.0972, 59.9572) (72.8317, 60.1704) (72.2504, 60.5866) (71.3901, 61.0754) (70.4297, 61.5347) (69.5826, 61.8759) (68.4322, 62.2648) (67.4425, 62.5442) (66.1307, 62.8516) (65.027, 63.0635) (63.595, 63.2862) (62.4143, 63.4312) (61.1039, 63.5554) (60.3883, 63.6089) (59.9752, 63.6356) knots 0 0 0 0 0.108911 0.217823 0.272278 0.38119 0.435645 0.544557 0.599012 0.707924 0.762379 0.871291 0.925747 1 1 1 1
  spline S3 degree 3 poles (75.9752, 52.7508) (75.9752, 53.2802) (75.9431, 54.1752) (75.8223, 55.1158) (75.6926, 55.7827) (75.5863, 56.208) (75.4279, 56.7161) (75.2804, 57.1045) (75.0687, 57.5698) (74.8765, 57.9272) (74.6051, 58.3588) (74.3614, 58.6932) (74.0195, 59.1004) (73.638, 59.4977) (73.2859, 59.8058) (73.0972, 59.9572) knots 0 0 0 0 0.166667 0.291667 0.333333 0.416667 0.458333 0.541667 0.583333 0.666667 0.708333 0.791667 0.833333 0.916667 1 1 1 1
  line L7 (75.9752, -52.7764) -> (75.9752, 52.7508)
  spline S4 degree 3 poles (73.0972, -59.9828) (73.2859, -59.8313) (73.638, -59.5233) (74.0195, -59.126) (74.3614, -58.7188) (74.6051, -58.3843) (74.8765, -57.9527) (75.0687, -57.5953) (75.2804, -57.1301) (75.4279, -56.7417) (75.5863, -56.2336) (75.6926, -55.8083) (75.8007, -55.2525) (75.8676, -54.7887) (75.9281, -54.186) (75.9662, -53.5615) (75.9752, -53.0411) (75.9752, -52.7764) knots 0 0 0 0 0.083333 0.166667 0.208333 0.291667 0.333333 0.416667 0.458333 0.541667 0.583333 0.666667 0.708333 0.791667 0.833333 0.916667 1 1 1 1
  spline S5 degree 3 poles (59.9752, -63.6611) (60.3883, -63.6345) (61.1039, -63.581) (62.4143, -63.4568) (63.595, -63.3118) (65.027, -63.0891) (66.1307, -62.8772) (67.4425, -62.5698) (68.4322, -62.2903) (69.5826, -61.9014) (70.4297, -61.5602) (71.3901, -61.101) (72.2504, -60.6122) (72.8317, -60.196) (73.0972, -59.9828) knots 0 0 0 0 0.074253 0.128709 0.237621 0.292076 0.400988 0.455443 0.564355 0.61881 0.727722 0.782177 0.891089 1 1 1 1
  spline S6 degree 4 poles (74.9752, -62.3223) (72.4991, -64.31) (68.939, -65.7118) (64.3981, -66.3953) (59.9752, -66.667) knots 0 0 0 0 0 1 1 1 1 1
  spline S7 degree 4 poles (78.9752, -52.7764) (78.9752, -55.4644) (78.6098, -58.1763) (77.2498, -60.4964) (74.9752, -62.3223) knots 0 0 0 0 0 1 1 1 1 1
  line L8 (71.9752, 52.7508) -> (71.9752, -52.7764)
  spline S8 degree 5 poles (59.7179, 59.6438) (61.136, 59.5524) (62.551, 59.417) (63.9606, 59.2241) (66.2021, 58.8052) (68.3651, 58.0878) (69.1524, 57.7616) (69.9266, 57.3714) (70.5933, 56.8379) knots 0 0 0 0 0 0 0.624879 0.624879 0.624879 1 1 1 1 1 1
  spline S9 degree 5 poles (70.5933, 56.8379) (70.8602, 56.6226) (71.1092, 56.3872) (71.3311, 56.1151) (71.7518, 55.3124) (71.9043, 54.4128) (71.9552, 53.862) (71.9752, 53.3056) (71.9752, 52.7508) knots 0 0 0 0 0 0 0.381774 0.381774 0.381774 1 1 1 1 1 1
  spline S10 degree 5 poles (71.9752, -52.7764) (71.9754, -53.3312) (71.9552, -53.8876) (71.9042, -54.4384) (71.7518, -55.338) (71.3311, -56.1407) (71.1092, -56.4128) (70.8602, -56.6482) (70.5933, -56.8635) knots 0 0 0 0 0 0 0.618226 0.618226 0.618226 1 1 1 1 1 1
  spline S11 degree 5 poles (70.5933, -56.8635) (69.9266, -57.397) (69.1524, -57.7871) (68.3651, -58.1134) (66.2021, -58.8308) (63.9606, -59.2497) (62.551, -59.4425) (61.136, -59.578) (59.7179, -59.6694) knots 0 0 0 0 0 0 0.375121 0.375121 0.375121 1 1 1 1 1 1
  point P0 (0, 0)
  point P1 (71.9752, -28.4266)
  point P2 (59.9752, -59.6522)
  point P3 (59.9752, 59.6267)
  point P4 (71.9752, 28.401)
  dimension "d20" = 4
extrude "Выдавливание5" add sketch "Эскиз5" along normal blind 1.9 contours S8 S9 L8 L4 L5 | L1 L2 L8 S10 S11
sketch "Эскиз7" plane through (0, 0, 3) normal (0, 0, 1) x (1, 0, 0)
  circle A0 centre (-66.9752, 49.9872) radius 1.6 projected
  circle A1 centre (-66.9752, -50.0128) radius 1.6 projected
  line L0 (-78.9752, 52.7508) -> (-78.9752, -52.7764) projected
  line L1 (-59.9752, -66.667) -> (-59.9752, -28.4266) projected
  line L2 (-59.9752, -28.4266) -> (-75.9752, -28.4266) projected
  line L3 (-75.9752, -28.4266) -> (-75.9752, 28.401) projected
  line L4 (-75.9752, 28.401) -> (-59.9752, 28.401) projected
  line L5 (-59.9752, 28.401) -> (-59.9752, 66.6415) projected
  line L6 (-71.2752, 31.701) -> (-66.2752, 31.701)
  line L7 (-66.2752, 31.701) -> (-66.2752, 41.701)
  line L8 (-66.2752, 41.701) -> (-71.2752, 41.701)
  line L9 (-71.2752, 41.701) -> (-71.2752, 31.701)
  line L10 (-71.2752, 31.701) -> (-66.2752, 41.701) construction
  line L11 (-66.2752, 31.701) -> (-71.2752, 41.701) construction
  line L12 (-65.9752, 42.001) -> (-65.9752, 31.401)
  line L13 (-65.9752, 31.401) -> (-71.5752, 31.401)
  line L14 (-71.5752, 31.401) -> (-71.5752, 42.001)
  line L15 (-71.5752, 42.001) -> (-65.9752, 42.001)
  point P0 (0, 0)
  point P1 (-68.7752, 36.701)
  dimension "d38" = 5
  dimension "d39" = 10
  dimension "d40" = 0.3
  dimension "d41" = 3
  dimension "d42" = 6
extrude "Выдавливание7" cut sketch "Эскиз7" against normal blind 1.8 contours L9 L8 L7 L6 | L12 L13 L14 L15
sketch "Эскиз8" plane through (0, 0, 3) normal (0, 0, 1) x (1, 0, 0)
  line L0 (-65.9752, 31.401) -> (-71.5752, 31.401) projected
  line L1 (-71.5752, 31.401) -> (-71.5752, 42.001) projected
  line L2 (-71.5752, 42.001) -> (-65.9752, 42.001) projected
  line L3 (-65.9752, 42.001) -> (-65.9752, 31.401) projected
  circle A0 centre (-66.9752, 49.9872) radius 1.6 projected
  circle A1 centre (-66.9752, -50.0128) radius 1.6 projected
  line L4 (-78.9752, 52.7508) -> (-78.9752, -52.7764) projected
  line L5 (-59.9752, -66.667) -> (-59.9752, -28.4266) projected
  line L6 (-59.9752, -28.4266) -> (-75.9752, -28.4266) projected
  line L7 (-75.9752, -28.4266) -> (-75.9752, 28.401) projected
  line L8 (-75.9752, 28.401) -> (-59.9752, 28.401) projected
  line L9 (-59.9752, 28.401) -> (-59.9752, 66.6415) projected
  line L10 (-61.6823, 45.001) -> (-72.9672, 45.001) projected
  line L11 (-59.9752, 28.401) -> (-71.9752, 28.401) projected
  line L12 (-59.9752, 28.401) -> (-62.9752, 28.401)
  line L13 (-62.9752, 28.401) -> (-62.9752, 45.001)
  line L14 (-62.9752, 45.001) -> (-59.9752, 45.001)
  line L15 (-59.9752, 45.001) -> (-59.9752, 28.401)
  line L16 (-59.9752, 28.401) -> (-59.9752, 66.6415) projected
  line L17 (-62.9752, 45.001) -> (-59.9752, 45.001)
  line L18 (-59.9752, 45.001) -> (-59.9752, 45.251)
  line L19 (-59.9752, 45.251) -> (-62.9752, 45.251)
  line L20 (-62.9752, 45.251) -> (-62.9752, 45.001)
  point P0 (0, 0)
  dimension "d45" = 3
  dimension "d48" = 0.25
extrude "Выдавливание8" cut sketch "Эскиз8" against normal blind 3 contours L13 L10 L14 L9 L8 | L20 L19 L9 L14 L10
chamfer "Фаска3" distance 1 angle 45 2 edges at (-61.4752, 45.251, 3) (-62.9752, 36.826, 3)
mirror "Зеркальное отражение1" about plane through (0, 0, 0) normal (0, 1, 0) of "Выдавливание7", "Выдавливание8", "Фаска3"
properties part number "back_diffuser"
